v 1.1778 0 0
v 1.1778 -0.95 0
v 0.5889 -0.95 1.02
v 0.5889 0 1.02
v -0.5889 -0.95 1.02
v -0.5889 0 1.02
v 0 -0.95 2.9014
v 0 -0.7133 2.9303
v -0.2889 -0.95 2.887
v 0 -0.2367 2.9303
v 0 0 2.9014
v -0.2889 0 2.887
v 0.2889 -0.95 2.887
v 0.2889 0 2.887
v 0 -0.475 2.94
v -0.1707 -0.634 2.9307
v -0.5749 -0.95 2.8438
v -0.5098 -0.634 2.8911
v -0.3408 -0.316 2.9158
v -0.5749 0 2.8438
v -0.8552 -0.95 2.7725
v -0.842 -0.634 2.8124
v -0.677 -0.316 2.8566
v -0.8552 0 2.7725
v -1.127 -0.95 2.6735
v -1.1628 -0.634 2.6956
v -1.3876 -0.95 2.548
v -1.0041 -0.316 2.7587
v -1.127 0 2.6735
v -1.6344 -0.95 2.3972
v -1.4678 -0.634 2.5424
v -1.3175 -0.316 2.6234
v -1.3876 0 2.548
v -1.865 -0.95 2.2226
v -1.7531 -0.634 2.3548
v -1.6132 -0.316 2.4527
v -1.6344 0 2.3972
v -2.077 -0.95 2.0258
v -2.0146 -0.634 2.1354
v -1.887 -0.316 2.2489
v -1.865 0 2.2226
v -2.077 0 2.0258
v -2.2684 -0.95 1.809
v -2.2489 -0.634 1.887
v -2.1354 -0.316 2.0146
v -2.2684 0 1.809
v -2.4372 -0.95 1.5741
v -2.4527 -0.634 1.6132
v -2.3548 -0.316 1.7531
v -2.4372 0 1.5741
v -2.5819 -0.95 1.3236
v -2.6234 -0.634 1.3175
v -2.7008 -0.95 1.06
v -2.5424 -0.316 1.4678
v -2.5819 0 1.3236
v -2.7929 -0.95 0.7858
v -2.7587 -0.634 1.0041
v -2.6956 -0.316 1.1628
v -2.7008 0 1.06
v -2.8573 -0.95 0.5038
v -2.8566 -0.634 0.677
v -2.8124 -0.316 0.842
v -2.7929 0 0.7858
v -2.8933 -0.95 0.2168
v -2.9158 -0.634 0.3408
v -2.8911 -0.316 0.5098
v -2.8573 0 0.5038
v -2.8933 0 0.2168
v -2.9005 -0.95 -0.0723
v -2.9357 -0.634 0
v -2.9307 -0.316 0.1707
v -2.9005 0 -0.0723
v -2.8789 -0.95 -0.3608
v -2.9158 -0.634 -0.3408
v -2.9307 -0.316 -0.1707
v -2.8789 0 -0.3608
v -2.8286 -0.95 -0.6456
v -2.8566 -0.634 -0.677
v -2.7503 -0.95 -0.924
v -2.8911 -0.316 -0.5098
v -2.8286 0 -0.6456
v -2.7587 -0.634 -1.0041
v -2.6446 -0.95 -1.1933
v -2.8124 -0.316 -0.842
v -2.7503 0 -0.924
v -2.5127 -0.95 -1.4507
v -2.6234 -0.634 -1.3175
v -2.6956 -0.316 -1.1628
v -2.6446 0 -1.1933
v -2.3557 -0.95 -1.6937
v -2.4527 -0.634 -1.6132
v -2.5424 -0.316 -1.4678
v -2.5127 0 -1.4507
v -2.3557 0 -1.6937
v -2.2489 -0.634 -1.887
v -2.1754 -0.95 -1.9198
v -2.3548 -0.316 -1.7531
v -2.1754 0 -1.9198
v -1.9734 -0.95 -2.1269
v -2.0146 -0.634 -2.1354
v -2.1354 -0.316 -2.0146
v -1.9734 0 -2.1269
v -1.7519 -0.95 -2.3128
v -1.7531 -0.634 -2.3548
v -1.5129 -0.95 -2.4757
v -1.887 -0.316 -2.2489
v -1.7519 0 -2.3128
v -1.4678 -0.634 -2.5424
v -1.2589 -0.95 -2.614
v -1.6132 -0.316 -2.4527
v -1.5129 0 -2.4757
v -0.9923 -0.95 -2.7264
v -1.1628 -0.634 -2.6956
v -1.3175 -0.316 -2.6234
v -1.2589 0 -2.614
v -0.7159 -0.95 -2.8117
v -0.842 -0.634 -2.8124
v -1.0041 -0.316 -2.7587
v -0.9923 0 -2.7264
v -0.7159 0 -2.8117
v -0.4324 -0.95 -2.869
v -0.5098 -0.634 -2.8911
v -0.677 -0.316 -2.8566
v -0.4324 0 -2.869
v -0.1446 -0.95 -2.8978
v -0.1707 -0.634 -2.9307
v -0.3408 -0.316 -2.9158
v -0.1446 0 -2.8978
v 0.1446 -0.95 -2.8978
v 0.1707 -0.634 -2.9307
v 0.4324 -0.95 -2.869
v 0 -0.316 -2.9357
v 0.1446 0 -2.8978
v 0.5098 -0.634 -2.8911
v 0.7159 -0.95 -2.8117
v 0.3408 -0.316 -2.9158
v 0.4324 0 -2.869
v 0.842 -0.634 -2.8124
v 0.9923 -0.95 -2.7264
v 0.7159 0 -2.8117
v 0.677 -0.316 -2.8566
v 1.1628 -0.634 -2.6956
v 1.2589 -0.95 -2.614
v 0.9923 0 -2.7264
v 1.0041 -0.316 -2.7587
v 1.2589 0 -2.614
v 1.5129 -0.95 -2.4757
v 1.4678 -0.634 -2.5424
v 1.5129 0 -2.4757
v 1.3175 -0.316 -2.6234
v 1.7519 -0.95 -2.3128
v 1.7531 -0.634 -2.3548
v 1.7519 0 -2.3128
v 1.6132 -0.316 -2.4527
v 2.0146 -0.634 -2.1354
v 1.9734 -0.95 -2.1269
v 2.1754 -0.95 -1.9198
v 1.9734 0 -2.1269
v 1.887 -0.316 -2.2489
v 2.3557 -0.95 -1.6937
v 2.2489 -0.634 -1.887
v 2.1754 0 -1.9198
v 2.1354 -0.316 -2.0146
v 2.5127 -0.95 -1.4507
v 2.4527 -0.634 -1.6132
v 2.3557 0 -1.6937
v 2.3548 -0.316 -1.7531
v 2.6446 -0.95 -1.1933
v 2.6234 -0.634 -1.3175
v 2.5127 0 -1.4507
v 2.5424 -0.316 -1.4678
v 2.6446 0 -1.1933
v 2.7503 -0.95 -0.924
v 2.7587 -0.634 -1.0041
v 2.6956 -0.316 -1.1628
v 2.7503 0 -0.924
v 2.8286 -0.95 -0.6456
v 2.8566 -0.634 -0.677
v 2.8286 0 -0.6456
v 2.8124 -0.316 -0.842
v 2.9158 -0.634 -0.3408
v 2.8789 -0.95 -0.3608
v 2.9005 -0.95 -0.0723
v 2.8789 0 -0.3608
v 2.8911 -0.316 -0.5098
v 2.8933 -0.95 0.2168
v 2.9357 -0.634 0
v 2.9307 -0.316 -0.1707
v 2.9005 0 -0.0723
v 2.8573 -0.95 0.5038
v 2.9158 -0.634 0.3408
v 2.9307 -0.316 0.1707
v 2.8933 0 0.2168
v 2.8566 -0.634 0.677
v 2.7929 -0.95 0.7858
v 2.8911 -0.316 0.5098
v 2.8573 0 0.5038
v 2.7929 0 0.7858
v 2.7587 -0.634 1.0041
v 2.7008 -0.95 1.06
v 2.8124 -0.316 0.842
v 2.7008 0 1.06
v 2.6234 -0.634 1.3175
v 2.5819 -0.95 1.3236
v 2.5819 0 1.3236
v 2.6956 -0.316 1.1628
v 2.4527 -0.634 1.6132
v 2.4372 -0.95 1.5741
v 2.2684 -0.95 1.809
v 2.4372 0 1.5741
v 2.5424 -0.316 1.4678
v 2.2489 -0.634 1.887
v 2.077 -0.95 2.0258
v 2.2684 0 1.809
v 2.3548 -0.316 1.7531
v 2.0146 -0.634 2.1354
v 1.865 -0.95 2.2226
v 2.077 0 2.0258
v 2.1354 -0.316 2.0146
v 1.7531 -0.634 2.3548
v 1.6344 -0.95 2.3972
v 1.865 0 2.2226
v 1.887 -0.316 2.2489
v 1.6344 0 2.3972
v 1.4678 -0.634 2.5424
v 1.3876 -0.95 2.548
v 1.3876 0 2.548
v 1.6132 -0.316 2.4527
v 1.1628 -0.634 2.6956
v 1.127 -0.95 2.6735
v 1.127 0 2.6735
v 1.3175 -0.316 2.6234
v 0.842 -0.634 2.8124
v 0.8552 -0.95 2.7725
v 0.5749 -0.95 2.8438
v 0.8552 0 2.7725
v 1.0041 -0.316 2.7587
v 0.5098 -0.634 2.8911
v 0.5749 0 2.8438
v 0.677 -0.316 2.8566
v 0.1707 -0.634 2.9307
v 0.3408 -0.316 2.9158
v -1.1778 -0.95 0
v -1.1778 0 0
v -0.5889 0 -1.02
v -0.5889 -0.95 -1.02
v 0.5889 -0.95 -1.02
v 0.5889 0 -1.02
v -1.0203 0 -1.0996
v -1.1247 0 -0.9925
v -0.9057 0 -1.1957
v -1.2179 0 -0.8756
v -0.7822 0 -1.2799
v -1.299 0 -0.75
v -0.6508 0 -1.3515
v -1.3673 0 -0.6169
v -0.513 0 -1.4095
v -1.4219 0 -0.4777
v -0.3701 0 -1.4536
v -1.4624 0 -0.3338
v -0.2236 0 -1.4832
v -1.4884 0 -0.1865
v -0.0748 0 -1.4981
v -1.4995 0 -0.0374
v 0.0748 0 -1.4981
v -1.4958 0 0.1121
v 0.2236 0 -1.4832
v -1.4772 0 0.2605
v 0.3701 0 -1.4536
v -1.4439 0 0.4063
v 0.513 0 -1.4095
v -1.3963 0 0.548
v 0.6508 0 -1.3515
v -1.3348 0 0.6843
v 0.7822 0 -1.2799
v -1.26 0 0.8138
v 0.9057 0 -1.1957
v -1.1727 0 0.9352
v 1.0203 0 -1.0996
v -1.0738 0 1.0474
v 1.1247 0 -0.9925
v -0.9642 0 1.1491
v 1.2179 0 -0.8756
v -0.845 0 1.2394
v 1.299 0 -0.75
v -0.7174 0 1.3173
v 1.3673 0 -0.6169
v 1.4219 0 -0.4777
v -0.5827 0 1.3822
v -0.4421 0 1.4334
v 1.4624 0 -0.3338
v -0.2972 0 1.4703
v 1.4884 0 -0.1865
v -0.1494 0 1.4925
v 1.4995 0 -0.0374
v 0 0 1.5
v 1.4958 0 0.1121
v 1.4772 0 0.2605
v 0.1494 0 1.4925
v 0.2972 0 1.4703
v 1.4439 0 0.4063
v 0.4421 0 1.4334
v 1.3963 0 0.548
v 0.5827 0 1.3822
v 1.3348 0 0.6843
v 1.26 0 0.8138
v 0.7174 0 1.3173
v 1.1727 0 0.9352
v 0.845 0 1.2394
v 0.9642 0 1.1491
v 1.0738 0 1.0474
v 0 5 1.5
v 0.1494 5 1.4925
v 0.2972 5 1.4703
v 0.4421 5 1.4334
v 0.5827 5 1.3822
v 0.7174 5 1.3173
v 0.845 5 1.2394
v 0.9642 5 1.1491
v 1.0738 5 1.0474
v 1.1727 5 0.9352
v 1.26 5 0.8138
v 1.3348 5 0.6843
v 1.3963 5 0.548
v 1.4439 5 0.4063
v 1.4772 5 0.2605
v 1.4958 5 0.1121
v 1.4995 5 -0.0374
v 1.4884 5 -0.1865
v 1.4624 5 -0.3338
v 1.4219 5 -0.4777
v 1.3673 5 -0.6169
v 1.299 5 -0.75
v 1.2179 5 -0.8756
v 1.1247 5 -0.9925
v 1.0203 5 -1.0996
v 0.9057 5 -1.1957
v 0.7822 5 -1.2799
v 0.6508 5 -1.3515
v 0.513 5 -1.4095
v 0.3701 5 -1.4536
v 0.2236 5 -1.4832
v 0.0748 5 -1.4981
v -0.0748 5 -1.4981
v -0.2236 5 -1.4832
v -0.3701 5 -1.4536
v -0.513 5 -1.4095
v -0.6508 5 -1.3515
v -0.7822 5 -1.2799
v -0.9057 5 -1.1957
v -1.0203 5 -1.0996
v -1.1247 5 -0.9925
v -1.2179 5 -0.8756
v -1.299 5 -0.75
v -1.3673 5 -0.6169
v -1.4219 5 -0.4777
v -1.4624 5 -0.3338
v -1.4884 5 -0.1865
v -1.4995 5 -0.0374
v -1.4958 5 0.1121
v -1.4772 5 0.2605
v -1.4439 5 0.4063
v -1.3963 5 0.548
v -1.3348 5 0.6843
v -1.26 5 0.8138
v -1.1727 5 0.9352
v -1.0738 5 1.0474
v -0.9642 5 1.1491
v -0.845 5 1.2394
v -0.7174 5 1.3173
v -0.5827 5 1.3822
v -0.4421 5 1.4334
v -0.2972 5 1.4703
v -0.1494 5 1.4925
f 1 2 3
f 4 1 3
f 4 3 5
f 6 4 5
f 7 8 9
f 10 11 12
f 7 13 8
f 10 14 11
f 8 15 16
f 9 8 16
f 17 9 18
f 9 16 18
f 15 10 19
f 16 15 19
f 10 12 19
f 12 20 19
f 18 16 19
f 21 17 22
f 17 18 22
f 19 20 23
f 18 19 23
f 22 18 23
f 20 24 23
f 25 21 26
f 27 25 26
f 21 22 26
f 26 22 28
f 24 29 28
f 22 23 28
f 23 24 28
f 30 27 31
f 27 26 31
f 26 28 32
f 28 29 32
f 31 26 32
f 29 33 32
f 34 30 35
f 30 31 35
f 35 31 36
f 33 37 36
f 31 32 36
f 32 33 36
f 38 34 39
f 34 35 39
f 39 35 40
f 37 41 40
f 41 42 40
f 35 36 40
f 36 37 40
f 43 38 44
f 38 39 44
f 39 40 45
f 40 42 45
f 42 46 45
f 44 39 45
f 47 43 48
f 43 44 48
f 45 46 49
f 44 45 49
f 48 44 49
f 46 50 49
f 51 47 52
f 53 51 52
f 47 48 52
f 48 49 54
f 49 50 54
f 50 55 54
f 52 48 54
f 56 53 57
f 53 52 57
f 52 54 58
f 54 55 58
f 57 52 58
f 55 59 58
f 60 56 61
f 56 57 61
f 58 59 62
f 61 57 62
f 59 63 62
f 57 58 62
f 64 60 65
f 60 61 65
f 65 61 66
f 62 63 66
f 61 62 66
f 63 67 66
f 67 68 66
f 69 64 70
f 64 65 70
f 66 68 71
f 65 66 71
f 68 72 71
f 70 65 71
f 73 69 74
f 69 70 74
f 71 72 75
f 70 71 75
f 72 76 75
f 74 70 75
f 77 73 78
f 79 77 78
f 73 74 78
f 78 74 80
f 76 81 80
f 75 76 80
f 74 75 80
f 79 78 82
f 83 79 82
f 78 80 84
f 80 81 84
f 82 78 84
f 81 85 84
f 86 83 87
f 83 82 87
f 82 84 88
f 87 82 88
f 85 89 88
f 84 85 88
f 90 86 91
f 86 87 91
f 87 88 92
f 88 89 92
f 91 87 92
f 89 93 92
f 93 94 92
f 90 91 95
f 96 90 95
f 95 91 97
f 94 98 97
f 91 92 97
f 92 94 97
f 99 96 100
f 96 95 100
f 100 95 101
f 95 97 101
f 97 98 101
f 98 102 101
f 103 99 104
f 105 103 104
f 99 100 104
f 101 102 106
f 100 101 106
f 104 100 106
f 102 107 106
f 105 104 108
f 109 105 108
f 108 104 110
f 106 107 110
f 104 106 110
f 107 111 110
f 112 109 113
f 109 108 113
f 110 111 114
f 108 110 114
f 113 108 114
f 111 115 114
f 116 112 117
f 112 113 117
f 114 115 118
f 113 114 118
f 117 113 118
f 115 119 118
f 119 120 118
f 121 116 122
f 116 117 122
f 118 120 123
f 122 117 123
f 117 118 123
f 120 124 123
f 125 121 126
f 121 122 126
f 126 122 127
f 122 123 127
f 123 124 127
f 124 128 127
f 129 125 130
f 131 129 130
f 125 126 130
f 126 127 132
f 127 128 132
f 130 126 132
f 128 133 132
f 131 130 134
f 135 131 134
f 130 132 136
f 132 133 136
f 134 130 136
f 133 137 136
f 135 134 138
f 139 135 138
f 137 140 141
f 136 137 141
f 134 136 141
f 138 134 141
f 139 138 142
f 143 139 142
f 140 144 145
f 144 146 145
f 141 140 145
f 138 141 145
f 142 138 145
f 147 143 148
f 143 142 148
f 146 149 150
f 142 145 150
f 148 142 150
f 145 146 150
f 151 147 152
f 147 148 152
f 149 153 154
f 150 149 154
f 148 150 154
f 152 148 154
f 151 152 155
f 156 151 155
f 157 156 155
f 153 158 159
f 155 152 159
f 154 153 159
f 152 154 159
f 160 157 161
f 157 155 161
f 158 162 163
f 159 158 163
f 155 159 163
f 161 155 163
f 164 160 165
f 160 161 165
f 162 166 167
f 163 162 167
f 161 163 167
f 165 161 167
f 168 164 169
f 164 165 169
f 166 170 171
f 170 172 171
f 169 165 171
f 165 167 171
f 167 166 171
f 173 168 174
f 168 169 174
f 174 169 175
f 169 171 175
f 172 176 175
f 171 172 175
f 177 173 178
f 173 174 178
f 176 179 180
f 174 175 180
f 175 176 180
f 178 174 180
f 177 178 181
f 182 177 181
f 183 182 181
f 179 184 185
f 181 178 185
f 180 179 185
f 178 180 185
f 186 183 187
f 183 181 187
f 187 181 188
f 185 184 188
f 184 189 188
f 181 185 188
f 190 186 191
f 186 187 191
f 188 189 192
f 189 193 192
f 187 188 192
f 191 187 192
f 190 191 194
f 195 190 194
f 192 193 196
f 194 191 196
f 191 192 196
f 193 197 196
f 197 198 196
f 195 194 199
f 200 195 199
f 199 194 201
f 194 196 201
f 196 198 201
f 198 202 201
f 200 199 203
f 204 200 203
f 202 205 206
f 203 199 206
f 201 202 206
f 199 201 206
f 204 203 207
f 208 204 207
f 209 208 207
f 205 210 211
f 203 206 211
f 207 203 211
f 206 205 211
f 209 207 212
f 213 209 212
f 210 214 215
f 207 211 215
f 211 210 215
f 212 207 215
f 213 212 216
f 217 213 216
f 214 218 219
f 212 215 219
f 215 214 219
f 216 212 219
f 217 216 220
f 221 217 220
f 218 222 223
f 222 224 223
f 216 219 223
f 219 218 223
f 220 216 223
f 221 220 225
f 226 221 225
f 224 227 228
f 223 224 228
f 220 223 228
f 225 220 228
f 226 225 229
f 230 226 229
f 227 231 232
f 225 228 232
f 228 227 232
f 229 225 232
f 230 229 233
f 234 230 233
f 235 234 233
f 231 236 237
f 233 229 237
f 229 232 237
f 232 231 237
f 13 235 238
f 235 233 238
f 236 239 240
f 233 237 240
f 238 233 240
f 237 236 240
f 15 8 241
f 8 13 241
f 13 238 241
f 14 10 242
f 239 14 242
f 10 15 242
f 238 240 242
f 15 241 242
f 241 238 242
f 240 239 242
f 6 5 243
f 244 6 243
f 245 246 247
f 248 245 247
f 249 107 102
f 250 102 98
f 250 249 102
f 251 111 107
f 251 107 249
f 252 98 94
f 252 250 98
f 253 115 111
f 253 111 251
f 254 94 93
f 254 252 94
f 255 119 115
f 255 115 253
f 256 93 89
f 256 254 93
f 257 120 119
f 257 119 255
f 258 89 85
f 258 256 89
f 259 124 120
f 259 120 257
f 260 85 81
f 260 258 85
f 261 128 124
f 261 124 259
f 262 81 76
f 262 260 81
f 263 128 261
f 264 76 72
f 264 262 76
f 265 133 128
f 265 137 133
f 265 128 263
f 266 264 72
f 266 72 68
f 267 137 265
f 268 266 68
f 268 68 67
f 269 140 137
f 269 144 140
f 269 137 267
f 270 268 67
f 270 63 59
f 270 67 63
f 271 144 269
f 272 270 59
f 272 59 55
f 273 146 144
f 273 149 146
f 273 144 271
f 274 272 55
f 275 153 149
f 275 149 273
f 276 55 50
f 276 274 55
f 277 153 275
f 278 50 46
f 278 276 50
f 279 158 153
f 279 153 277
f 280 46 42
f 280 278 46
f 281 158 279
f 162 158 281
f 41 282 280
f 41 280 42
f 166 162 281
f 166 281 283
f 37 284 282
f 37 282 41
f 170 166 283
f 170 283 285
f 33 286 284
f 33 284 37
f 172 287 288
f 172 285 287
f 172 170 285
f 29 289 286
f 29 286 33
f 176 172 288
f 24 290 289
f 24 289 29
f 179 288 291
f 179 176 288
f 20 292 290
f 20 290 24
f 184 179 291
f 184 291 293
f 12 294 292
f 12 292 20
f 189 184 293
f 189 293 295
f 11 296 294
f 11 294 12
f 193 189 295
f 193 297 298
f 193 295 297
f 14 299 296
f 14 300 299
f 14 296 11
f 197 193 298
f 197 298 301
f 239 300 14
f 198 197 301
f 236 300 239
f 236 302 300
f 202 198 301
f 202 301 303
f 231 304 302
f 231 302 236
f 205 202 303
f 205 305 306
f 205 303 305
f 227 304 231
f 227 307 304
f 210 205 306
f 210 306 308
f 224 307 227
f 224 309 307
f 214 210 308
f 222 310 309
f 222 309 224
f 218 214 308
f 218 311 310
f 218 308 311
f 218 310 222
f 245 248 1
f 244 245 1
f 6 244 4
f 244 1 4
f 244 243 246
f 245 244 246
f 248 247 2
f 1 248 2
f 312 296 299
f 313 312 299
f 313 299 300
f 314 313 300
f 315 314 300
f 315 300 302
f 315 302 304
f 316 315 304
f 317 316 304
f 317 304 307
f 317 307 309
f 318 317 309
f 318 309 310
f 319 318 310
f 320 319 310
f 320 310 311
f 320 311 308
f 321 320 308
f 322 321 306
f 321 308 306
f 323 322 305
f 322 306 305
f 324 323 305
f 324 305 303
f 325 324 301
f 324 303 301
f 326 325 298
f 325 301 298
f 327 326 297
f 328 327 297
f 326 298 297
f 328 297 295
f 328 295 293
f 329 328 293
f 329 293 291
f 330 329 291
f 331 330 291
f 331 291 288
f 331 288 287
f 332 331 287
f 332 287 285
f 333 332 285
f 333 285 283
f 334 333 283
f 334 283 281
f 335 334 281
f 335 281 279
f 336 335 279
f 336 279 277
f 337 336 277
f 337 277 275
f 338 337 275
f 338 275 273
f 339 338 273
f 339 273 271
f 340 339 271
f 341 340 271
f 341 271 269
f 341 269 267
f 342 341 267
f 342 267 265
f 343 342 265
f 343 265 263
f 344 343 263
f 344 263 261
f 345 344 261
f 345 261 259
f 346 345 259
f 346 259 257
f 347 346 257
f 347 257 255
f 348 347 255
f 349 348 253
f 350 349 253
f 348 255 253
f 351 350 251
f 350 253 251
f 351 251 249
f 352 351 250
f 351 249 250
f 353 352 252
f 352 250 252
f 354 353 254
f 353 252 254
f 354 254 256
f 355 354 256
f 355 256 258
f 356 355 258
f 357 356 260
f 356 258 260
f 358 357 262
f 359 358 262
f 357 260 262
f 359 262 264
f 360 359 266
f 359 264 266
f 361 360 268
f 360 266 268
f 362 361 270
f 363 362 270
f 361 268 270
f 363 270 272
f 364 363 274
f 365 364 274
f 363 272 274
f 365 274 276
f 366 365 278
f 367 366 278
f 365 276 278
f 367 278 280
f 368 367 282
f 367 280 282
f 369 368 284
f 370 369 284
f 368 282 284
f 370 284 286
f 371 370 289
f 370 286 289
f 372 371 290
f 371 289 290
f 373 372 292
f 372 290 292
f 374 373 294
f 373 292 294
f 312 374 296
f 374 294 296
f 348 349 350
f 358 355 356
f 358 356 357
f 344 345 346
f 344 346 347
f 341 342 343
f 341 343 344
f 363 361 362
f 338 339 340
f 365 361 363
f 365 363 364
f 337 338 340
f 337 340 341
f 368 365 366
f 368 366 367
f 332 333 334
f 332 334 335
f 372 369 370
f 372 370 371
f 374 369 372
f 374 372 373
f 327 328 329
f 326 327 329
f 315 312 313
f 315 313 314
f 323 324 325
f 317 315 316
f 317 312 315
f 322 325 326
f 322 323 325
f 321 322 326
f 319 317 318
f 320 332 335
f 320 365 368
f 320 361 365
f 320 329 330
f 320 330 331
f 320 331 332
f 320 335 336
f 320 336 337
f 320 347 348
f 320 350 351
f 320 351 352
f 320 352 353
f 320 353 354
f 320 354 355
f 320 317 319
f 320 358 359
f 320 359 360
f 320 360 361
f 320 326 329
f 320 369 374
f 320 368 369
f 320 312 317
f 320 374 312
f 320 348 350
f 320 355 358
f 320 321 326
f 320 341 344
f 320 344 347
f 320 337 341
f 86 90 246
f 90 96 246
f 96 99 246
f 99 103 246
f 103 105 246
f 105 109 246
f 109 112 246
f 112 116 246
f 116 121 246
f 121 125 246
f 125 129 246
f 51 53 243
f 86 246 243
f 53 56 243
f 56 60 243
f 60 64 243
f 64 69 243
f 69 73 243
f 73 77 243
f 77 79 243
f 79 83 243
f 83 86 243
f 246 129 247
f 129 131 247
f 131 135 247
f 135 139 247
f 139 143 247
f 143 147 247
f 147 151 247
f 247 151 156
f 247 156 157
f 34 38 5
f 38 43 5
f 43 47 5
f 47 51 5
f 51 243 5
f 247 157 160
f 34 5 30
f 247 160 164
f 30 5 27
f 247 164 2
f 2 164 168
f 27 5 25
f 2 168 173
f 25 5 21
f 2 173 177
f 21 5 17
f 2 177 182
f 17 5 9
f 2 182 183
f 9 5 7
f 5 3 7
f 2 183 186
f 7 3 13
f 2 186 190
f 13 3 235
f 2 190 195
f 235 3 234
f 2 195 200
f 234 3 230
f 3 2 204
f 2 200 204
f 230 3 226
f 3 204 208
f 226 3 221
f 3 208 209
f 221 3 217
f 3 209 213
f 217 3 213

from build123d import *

# Parameters (mm, degrees)
SKETCH_1_R          = 1.5
EXTRUDE_1_DEPTH     = 2
SKETCH_2_R          = 2.95
EXTRUDE_2_DEPTH     = 0.95
CUT_EXTRUDE_1_DEPTH = 1
SKETCH_1_8_R        = 1.5
EXTRUDE_5_DEPTH     = 5


with BuildPart() as part:
    # 草图1 → 拉伸1 (new body)
    with BuildSketch(Plane(origin=(0, 0, 0), x_dir=(1, 0, 0), z_dir=(0, 1, 0))):
        Circle(SKETCH_1_R)
    extrude(amount=EXTRUDE_1_DEPTH)

    # 草图2 → Extrude 2 (add)
    with BuildSketch(Plane(origin=(0, 0, 0), x_dir=(-1, 0, 0), z_dir=(0, 1, 0))):
        Circle(SKETCH_2_R)
    extrude(amount=-EXTRUDE_2_DEPTH)

    # 草图4 → 切除-旋转1 (revolve, cut)
    with BuildSketch(Plane(origin=(0, 0, 0), x_dir=(0, 0, -1), z_dir=(1, 0, 0))):
        with BuildLine():
            Line((-2.901374674, 0), (-2.95, 0))
            Line((-2.95, 0), (-2.95, -0.95))
            Line((-2.95, -0.95), (-2.901374674, -0.95))
            ThreePointArc((-2.901374674, -0.95), (-2.94, -0.475), (-2.901374674, 0))
        make_face()
    revolve(axis=Axis((0, 3.165730861, 0), (0, -1, 0)), mode=Mode.SUBTRACT)

    # 草图3 → 切除-拉伸1 (cut)
    with BuildSketch(Plane.XZ.offset(0.95)):
        Polygon((-1.177794549, 0), (-0.588897275, -1.02), (0.588897275, -1.02), (1.177794549, 0), (0.588897275, 1.02), (-0.588897275, 1.02), align=None)
    extrude(amount=-CUT_EXTRUDE_1_DEPTH, mode=Mode.SUBTRACT)

    # 草图1<8> → 凸台-拉伸5 (add)
    with BuildSketch(Plane(origin=(0, 0, 0), x_dir=(1, 0, 0), z_dir=(0, 1, 0))):
        Circle(SKETCH_1_8_R)
    extrude(amount=EXTRUDE_5_DEPTH)


solid = part.part
